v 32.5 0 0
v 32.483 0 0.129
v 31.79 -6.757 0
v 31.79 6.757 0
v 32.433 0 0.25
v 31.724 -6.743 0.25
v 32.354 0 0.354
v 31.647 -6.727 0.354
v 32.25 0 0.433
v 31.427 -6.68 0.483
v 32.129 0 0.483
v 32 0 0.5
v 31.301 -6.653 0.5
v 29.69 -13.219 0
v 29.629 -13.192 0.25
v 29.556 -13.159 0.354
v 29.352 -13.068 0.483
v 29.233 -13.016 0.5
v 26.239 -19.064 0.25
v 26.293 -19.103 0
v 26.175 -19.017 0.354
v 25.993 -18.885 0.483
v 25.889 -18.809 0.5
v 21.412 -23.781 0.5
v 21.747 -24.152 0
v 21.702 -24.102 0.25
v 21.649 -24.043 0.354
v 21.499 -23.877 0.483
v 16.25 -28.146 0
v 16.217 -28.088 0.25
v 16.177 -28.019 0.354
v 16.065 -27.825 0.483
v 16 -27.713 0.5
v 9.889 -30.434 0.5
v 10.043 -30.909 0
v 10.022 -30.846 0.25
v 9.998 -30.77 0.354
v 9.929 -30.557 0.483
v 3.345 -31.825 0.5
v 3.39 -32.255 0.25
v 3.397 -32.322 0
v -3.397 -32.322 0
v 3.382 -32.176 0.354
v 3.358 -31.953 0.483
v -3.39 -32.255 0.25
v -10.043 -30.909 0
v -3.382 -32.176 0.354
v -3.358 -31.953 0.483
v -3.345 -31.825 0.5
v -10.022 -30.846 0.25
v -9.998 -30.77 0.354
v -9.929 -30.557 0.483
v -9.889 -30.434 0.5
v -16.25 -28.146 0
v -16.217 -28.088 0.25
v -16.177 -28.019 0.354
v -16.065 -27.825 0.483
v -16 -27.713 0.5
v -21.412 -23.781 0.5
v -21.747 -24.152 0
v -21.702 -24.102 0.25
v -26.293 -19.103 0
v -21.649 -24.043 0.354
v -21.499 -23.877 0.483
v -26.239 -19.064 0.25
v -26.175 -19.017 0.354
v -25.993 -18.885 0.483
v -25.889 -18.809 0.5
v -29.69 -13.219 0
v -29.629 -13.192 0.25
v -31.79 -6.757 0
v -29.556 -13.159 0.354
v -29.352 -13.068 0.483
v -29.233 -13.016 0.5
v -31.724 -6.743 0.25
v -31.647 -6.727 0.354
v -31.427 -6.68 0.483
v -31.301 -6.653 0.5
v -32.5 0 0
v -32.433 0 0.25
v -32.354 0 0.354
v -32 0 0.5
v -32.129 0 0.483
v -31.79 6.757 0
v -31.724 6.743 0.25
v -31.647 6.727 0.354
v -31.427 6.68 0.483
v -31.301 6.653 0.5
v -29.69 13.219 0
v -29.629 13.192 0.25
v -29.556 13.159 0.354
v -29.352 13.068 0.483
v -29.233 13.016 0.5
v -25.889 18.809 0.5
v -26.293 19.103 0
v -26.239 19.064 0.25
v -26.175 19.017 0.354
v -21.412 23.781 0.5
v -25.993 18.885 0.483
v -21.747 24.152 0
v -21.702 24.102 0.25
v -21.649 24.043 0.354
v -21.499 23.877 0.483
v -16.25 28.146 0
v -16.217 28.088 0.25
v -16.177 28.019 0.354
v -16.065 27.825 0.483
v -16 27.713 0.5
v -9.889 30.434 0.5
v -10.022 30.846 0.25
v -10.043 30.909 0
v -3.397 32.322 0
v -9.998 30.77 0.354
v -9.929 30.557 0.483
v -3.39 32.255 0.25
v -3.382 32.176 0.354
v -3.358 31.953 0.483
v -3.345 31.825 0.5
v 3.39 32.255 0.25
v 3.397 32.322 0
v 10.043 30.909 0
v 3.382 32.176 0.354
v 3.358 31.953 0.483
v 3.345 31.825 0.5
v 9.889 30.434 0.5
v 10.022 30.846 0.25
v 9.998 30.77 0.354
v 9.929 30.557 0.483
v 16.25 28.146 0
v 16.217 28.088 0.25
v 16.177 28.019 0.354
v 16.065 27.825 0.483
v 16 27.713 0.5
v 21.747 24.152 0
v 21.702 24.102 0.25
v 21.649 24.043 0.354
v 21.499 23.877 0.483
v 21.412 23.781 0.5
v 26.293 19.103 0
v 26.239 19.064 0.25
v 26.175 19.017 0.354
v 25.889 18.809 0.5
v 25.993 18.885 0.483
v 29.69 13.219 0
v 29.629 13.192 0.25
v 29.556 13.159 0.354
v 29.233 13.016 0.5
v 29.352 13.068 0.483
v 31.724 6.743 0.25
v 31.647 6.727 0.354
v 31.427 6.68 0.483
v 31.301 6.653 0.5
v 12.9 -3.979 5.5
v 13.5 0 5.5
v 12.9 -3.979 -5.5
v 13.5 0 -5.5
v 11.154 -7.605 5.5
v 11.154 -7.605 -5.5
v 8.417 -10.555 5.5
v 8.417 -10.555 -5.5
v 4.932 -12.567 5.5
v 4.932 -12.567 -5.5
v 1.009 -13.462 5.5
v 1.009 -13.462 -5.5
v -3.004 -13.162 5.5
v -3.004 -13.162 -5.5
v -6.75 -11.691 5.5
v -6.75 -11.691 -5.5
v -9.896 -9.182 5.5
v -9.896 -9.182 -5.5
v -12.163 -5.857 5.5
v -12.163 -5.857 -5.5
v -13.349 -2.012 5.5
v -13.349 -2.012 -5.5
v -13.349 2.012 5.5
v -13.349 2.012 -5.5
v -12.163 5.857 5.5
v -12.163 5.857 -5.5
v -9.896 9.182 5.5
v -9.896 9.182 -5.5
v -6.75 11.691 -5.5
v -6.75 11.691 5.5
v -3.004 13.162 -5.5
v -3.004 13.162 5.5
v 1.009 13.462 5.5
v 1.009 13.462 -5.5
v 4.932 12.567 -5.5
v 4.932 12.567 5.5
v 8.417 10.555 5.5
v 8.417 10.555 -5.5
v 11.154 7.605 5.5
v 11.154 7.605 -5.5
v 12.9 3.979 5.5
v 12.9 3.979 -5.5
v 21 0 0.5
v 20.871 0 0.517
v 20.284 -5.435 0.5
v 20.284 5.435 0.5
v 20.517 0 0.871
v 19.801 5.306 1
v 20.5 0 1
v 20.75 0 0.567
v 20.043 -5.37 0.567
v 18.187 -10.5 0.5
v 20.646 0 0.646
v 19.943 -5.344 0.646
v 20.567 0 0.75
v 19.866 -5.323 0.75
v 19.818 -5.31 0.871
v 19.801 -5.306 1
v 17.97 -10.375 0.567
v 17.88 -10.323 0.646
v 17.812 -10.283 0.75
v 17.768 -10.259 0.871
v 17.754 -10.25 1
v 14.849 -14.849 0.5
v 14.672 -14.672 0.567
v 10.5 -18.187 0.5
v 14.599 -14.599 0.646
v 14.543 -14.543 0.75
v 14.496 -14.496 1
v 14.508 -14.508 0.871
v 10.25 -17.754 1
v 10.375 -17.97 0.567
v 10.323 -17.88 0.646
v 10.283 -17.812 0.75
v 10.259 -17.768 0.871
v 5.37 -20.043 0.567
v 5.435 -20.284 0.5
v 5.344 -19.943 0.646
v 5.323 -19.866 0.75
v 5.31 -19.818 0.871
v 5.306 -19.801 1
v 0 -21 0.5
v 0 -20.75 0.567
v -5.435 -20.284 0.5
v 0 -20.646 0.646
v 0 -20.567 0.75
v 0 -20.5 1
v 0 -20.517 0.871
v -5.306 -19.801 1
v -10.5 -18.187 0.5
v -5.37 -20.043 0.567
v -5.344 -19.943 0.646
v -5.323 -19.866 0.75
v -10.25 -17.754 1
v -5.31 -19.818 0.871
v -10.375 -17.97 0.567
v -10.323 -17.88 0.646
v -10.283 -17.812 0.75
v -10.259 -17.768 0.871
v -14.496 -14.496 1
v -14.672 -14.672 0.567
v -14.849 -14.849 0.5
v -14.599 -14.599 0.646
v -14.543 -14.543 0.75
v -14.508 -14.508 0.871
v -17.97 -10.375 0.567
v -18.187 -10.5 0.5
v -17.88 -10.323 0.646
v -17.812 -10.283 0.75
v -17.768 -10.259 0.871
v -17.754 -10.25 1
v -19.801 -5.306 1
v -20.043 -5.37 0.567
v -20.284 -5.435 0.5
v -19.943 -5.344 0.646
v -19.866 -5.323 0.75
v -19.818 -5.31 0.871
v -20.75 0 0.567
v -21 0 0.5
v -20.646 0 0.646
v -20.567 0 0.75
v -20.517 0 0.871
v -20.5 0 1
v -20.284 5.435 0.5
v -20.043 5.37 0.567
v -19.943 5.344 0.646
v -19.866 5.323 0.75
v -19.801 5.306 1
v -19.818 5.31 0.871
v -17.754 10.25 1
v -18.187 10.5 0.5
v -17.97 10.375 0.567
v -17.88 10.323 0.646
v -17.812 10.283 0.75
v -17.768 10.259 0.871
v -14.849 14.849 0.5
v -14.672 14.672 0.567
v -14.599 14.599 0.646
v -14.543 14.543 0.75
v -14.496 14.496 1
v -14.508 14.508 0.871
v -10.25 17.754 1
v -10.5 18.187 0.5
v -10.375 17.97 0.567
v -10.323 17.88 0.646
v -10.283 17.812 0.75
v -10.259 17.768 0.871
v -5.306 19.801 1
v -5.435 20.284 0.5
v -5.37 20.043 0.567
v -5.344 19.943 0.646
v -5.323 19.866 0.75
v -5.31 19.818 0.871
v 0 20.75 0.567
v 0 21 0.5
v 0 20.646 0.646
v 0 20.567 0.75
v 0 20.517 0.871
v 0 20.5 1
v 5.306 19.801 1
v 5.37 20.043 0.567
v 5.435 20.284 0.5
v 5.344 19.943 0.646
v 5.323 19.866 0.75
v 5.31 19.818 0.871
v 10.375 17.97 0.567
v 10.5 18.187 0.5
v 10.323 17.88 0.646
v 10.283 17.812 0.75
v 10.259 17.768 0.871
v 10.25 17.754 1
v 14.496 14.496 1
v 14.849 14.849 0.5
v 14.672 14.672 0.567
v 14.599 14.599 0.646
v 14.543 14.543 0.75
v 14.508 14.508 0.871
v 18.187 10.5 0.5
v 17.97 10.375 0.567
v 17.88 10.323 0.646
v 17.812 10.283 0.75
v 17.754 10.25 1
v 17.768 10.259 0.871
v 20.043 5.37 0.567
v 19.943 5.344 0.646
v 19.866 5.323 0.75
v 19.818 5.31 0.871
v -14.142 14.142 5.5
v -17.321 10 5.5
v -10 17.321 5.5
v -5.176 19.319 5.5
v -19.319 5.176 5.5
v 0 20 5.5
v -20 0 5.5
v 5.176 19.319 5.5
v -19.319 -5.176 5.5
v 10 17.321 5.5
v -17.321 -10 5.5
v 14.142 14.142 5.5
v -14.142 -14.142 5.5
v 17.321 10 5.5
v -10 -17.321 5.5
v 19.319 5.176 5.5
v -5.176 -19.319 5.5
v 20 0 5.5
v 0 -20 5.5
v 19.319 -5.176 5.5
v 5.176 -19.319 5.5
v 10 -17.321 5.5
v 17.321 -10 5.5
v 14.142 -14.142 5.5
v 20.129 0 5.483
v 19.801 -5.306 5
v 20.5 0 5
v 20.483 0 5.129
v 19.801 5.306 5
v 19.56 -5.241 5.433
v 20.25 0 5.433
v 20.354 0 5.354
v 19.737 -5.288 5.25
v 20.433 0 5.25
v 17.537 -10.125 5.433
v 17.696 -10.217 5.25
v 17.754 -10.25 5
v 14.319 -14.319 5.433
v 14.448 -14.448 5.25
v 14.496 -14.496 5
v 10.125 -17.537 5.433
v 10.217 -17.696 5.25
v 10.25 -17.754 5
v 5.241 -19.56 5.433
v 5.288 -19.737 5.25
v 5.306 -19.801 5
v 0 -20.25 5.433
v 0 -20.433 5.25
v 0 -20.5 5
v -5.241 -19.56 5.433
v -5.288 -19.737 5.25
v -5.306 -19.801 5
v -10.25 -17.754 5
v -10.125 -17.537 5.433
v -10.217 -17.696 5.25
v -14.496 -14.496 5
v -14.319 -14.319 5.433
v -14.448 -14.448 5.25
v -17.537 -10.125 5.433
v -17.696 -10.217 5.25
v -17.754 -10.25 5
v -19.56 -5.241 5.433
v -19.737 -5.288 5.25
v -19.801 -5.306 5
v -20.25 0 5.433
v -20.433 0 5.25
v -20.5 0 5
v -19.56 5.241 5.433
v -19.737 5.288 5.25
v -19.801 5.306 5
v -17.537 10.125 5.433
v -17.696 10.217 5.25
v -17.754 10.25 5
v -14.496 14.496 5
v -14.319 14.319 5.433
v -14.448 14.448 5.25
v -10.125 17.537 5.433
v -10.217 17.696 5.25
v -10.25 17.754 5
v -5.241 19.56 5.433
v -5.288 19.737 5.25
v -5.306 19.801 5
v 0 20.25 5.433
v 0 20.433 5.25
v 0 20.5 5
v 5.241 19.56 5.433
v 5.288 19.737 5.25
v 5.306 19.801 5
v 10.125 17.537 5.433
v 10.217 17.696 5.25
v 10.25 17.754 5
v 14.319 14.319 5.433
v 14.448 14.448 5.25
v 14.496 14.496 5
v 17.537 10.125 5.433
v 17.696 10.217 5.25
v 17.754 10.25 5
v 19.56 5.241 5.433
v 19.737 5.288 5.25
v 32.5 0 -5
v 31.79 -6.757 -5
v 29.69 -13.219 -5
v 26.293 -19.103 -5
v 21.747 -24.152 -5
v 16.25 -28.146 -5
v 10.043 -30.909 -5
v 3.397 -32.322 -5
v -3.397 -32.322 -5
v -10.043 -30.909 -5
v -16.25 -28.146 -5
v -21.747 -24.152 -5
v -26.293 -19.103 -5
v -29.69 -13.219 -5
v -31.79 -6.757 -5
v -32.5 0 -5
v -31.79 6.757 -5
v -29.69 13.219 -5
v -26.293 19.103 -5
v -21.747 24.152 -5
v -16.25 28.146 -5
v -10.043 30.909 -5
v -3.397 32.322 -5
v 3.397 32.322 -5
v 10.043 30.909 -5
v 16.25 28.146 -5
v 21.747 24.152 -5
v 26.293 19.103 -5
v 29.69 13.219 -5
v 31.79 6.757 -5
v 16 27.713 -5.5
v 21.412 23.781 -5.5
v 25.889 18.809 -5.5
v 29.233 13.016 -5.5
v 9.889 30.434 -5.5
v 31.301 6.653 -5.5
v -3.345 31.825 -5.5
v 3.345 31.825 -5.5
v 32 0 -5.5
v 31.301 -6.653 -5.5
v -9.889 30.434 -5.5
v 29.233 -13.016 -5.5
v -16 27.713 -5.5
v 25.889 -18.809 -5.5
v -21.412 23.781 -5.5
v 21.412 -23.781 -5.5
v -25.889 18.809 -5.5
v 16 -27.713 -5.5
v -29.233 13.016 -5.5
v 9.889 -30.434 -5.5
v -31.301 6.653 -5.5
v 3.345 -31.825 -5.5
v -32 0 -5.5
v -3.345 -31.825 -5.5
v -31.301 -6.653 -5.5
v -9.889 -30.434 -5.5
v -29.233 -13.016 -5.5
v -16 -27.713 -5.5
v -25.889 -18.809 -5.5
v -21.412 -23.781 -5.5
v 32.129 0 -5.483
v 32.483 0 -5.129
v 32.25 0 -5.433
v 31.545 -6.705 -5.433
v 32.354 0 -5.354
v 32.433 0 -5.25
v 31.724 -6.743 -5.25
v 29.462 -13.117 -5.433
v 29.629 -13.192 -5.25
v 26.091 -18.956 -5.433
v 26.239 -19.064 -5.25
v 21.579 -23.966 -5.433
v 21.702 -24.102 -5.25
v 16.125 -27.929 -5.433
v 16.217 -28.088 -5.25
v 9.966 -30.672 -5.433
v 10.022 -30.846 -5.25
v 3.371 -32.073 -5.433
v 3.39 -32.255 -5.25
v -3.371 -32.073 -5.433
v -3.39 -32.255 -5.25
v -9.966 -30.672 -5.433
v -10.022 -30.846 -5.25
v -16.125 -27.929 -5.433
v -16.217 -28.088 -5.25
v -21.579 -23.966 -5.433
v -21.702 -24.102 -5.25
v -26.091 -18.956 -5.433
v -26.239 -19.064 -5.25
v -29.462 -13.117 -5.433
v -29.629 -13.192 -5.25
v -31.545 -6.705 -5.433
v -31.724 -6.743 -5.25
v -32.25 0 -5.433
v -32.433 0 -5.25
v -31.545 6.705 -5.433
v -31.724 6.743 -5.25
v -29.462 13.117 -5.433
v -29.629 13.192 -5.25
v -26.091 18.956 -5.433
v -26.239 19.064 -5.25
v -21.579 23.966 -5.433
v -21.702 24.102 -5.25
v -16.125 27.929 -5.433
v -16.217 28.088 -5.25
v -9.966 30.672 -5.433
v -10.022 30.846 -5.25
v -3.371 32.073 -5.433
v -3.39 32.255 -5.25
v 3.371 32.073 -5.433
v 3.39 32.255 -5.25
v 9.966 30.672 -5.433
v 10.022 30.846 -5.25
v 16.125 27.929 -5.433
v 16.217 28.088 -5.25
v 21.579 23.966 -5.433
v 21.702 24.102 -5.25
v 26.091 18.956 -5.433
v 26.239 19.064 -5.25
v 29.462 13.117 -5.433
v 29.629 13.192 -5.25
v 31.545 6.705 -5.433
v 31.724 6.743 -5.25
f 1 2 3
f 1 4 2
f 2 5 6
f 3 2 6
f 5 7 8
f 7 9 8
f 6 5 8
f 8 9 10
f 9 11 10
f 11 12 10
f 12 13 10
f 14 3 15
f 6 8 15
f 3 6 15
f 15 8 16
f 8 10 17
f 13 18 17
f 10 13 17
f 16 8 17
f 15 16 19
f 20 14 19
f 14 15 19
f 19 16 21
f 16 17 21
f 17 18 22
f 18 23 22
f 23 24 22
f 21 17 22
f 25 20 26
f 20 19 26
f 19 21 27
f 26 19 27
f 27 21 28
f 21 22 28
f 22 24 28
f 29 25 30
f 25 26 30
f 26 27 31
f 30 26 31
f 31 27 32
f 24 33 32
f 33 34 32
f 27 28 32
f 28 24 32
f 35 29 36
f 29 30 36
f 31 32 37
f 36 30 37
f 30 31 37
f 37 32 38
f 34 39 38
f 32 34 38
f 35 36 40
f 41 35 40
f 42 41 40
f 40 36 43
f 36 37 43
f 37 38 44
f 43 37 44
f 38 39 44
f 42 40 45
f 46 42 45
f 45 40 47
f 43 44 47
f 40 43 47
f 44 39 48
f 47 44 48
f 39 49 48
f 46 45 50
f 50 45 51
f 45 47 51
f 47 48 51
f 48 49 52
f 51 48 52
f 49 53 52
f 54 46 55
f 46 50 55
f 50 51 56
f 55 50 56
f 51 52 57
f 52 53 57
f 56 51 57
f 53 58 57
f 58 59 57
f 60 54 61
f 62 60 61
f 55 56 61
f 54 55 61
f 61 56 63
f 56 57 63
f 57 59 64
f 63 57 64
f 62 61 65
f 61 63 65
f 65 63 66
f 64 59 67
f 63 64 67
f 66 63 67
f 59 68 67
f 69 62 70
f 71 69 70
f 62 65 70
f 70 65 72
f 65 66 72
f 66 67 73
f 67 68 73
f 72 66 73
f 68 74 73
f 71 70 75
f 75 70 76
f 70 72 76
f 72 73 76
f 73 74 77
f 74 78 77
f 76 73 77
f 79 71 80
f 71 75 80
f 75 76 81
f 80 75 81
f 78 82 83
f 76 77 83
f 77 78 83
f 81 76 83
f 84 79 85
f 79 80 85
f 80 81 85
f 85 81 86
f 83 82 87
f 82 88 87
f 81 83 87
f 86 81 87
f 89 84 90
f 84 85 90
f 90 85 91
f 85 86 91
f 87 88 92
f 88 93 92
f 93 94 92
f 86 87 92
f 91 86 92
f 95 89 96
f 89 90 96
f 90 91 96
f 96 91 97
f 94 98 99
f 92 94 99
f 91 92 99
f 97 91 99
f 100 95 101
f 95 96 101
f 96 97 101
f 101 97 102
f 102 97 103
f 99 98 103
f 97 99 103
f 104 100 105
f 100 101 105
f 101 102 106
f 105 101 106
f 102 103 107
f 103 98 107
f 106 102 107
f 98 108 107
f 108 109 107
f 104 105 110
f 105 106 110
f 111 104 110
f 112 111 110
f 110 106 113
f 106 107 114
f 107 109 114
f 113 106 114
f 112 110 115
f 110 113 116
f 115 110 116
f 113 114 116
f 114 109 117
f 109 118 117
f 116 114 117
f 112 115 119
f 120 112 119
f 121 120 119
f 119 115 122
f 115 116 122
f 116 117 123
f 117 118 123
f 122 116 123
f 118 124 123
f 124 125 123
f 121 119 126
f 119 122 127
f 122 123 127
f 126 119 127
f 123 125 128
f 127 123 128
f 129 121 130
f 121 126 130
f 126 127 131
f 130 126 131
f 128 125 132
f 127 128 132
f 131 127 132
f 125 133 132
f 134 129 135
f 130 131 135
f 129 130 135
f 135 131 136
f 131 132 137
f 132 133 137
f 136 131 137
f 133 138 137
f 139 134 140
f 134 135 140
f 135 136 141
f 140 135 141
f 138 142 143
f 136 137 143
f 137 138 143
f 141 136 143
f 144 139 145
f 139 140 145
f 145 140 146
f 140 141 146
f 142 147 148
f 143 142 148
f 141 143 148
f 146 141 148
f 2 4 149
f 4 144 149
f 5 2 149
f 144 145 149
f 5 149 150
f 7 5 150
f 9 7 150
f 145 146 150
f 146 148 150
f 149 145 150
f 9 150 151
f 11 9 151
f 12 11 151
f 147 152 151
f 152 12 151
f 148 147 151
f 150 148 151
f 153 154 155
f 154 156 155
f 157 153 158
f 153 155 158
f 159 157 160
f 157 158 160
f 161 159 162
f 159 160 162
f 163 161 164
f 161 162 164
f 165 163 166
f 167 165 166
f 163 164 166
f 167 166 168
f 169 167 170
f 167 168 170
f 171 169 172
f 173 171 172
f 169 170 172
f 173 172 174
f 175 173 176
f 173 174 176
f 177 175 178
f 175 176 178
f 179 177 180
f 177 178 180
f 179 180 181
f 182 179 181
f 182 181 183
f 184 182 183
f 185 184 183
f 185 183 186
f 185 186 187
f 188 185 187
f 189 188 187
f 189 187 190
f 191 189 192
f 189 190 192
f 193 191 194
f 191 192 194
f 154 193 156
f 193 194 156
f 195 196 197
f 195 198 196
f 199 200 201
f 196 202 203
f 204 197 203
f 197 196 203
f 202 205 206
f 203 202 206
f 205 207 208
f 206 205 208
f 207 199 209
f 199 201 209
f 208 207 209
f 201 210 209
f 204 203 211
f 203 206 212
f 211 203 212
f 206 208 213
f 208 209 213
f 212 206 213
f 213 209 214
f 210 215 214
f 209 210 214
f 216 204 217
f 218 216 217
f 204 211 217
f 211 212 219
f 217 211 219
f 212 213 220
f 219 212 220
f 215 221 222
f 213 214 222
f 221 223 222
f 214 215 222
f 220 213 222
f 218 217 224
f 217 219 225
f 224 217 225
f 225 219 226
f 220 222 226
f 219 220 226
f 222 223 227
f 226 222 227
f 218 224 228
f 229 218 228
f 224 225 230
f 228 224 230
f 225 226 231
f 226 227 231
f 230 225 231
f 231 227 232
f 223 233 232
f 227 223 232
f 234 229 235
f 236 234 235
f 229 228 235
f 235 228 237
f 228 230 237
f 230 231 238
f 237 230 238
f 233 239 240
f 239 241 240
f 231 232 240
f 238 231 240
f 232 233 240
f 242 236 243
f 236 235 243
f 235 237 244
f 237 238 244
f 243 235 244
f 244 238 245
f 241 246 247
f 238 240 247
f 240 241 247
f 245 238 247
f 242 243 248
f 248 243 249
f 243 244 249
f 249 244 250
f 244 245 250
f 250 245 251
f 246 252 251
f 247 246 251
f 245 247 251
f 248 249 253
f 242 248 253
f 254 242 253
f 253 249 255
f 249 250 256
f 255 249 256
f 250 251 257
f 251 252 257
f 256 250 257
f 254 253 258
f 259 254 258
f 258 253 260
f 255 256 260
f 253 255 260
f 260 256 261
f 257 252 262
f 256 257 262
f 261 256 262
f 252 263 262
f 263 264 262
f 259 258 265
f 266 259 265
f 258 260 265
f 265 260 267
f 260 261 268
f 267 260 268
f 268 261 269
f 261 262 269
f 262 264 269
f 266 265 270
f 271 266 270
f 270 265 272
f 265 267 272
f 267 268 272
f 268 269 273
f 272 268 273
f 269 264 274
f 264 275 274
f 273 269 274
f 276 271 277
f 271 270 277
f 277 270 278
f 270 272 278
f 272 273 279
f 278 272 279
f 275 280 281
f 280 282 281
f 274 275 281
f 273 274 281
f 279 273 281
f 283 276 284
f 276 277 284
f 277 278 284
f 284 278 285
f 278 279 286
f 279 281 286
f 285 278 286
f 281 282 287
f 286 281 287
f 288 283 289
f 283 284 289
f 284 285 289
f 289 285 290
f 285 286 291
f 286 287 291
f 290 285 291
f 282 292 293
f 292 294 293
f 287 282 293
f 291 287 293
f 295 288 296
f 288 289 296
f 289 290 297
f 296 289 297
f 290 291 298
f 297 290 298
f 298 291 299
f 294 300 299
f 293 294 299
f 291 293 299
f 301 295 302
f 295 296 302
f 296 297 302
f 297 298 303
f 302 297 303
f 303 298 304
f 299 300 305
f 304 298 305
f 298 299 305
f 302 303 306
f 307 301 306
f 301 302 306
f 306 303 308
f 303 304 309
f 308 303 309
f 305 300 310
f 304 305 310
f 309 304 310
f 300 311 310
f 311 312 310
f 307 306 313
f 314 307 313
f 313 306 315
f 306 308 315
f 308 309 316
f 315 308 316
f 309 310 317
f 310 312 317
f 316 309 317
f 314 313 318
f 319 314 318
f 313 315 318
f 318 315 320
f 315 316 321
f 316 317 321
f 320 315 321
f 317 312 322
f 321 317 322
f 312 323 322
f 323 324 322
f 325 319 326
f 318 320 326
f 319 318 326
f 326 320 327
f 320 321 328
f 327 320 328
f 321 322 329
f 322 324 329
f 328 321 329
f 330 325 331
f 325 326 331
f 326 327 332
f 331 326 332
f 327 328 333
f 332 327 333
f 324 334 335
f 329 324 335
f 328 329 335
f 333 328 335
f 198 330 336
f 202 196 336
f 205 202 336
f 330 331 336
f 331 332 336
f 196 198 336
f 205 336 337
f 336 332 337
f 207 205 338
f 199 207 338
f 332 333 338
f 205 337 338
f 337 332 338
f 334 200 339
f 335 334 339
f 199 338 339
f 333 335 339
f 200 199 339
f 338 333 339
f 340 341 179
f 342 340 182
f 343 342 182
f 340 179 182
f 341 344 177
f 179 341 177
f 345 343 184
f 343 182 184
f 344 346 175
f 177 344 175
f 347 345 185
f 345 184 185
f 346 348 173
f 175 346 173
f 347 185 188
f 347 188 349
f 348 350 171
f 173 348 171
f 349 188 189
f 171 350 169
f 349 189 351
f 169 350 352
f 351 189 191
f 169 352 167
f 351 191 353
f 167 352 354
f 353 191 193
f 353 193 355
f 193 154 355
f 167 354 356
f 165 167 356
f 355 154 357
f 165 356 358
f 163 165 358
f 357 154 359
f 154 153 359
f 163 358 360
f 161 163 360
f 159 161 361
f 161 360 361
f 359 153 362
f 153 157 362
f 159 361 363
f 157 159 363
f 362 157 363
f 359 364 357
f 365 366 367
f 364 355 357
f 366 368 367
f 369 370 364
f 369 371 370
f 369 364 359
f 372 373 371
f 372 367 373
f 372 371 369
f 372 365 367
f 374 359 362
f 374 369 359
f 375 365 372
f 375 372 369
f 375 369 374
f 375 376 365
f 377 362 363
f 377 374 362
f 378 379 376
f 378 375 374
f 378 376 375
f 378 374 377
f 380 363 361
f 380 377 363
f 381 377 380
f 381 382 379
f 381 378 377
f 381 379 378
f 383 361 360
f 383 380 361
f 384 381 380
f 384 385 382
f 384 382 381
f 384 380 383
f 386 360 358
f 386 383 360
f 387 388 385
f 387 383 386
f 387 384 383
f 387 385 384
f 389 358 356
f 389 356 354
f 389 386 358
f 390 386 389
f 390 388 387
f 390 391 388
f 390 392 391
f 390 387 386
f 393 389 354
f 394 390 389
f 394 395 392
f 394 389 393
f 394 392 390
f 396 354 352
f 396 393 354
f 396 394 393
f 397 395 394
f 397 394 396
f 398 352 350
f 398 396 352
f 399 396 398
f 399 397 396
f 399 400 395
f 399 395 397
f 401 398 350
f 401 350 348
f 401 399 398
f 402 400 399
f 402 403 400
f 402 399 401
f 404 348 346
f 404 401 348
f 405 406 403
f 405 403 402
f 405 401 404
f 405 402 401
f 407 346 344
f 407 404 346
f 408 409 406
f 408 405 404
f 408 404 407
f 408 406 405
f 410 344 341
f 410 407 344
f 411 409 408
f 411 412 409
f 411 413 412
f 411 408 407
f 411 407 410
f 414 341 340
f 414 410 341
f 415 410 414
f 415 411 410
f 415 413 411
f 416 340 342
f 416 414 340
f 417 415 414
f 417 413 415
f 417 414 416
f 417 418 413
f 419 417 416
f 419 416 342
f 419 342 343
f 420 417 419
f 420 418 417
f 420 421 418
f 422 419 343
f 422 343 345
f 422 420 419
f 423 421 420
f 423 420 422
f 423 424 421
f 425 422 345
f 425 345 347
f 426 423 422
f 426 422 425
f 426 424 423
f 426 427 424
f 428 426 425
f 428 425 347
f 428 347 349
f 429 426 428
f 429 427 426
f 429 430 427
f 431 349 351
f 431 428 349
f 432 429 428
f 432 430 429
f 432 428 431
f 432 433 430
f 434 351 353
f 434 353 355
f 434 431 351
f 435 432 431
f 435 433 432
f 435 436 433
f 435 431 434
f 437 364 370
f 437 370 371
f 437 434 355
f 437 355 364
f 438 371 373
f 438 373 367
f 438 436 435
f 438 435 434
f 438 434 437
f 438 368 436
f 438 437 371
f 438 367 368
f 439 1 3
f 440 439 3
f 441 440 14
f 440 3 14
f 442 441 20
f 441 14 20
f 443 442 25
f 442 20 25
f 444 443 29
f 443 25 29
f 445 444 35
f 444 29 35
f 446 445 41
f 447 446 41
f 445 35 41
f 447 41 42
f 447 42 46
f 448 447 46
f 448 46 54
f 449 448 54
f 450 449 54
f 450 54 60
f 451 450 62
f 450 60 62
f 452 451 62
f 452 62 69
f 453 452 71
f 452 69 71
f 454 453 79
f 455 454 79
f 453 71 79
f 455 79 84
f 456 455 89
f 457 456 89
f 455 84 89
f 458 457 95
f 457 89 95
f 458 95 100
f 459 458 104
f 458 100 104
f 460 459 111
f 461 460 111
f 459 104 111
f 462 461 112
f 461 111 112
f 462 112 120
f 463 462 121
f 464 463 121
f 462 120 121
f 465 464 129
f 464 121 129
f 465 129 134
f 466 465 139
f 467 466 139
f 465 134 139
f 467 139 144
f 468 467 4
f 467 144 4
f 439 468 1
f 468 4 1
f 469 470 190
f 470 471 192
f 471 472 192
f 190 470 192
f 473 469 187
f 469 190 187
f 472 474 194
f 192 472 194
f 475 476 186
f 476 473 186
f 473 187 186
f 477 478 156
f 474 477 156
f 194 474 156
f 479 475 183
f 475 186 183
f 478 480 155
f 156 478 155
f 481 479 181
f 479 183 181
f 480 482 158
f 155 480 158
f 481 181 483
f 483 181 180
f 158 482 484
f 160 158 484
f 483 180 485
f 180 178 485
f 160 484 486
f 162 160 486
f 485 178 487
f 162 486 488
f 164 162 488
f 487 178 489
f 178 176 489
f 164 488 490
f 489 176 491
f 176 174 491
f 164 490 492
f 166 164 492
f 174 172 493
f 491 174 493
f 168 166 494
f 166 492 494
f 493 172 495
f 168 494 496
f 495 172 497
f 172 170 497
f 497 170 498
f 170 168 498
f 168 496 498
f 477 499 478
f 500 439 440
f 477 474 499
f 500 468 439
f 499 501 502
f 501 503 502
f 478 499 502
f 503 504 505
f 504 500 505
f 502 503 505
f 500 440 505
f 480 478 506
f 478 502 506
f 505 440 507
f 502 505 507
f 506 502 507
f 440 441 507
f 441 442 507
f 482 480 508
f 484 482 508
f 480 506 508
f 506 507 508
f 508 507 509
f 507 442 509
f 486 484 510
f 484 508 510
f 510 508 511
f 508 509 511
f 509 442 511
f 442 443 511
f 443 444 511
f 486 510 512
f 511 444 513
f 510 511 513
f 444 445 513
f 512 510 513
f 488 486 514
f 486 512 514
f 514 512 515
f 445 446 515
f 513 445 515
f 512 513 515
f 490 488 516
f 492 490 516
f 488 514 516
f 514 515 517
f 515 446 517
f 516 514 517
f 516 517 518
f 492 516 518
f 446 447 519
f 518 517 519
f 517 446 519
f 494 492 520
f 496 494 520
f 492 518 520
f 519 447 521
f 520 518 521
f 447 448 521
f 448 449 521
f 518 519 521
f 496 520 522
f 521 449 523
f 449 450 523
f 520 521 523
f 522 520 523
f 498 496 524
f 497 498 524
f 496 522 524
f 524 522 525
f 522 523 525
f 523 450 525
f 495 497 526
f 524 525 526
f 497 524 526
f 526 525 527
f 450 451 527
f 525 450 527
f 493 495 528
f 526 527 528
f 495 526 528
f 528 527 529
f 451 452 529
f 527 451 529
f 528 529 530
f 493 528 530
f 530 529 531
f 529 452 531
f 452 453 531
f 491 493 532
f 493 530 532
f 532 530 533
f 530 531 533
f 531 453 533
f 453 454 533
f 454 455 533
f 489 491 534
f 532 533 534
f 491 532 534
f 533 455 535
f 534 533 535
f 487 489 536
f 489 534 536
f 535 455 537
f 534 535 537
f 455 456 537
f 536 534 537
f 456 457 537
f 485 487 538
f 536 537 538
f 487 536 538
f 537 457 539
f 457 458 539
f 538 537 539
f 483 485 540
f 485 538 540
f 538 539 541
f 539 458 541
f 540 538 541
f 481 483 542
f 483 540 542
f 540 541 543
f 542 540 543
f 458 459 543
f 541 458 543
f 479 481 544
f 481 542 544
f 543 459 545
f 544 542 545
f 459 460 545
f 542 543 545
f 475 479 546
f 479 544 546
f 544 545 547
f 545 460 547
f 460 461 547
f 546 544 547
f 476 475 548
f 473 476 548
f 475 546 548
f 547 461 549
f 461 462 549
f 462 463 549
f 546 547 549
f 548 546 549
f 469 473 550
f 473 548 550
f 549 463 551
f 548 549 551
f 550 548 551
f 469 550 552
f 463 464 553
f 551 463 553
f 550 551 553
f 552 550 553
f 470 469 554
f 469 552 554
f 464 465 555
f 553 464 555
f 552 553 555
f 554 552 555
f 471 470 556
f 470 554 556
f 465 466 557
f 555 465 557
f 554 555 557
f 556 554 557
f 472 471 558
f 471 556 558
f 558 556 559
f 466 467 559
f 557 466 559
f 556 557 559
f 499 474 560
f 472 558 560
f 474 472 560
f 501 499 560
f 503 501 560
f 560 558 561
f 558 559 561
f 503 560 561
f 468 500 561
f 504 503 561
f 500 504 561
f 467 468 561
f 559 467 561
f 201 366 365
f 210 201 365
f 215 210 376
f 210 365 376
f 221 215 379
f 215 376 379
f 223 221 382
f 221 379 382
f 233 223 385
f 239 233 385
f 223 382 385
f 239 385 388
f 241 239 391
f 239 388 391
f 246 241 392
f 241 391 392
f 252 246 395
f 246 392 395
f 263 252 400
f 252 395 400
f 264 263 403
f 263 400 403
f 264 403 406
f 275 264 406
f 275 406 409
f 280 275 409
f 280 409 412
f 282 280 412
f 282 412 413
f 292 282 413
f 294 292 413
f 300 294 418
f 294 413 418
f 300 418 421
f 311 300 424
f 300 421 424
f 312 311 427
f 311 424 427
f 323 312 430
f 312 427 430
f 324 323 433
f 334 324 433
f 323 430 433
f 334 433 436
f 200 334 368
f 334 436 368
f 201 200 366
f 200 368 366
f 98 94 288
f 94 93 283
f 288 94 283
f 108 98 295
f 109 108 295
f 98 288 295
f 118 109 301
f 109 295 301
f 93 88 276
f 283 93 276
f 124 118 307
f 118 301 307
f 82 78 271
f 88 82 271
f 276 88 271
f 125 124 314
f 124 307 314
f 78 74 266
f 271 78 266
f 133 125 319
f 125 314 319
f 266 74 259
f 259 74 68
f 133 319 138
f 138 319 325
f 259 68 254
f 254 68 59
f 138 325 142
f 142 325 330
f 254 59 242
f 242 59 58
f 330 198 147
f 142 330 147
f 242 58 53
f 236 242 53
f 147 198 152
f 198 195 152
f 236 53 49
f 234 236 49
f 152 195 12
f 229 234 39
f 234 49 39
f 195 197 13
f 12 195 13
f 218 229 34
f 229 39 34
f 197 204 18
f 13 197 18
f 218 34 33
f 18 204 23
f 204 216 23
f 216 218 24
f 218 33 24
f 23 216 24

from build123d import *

# Parameters (mm, degrees)
F2_R = 0.5


with BuildPart() as f1:
    # F0 (on Front) → F1 (revolve)
    with BuildSketch(Plane.XZ):
        Polygon((20.5, 5.5), (13.5, 5.5), (13.5, -5.5), (32.5, -5.5), (32.5, 0.5), (20.5, 0.5), align=None)
    revolve(axis=Axis((0, 0, -0.180863), (0, 0, -1)))

    # F2
    f2_edges = [f1.edges().sort_by_distance(p)[0] for p in [
        (-32.5, 0, -5.5),
        (-32.5, 0, 0.5),
        (-20.5, 0, 5.5),
        (-20.5, 0, 0.5),
    ]]
    fillet(f2_edges, radius=F2_R)


solid = f1.part
